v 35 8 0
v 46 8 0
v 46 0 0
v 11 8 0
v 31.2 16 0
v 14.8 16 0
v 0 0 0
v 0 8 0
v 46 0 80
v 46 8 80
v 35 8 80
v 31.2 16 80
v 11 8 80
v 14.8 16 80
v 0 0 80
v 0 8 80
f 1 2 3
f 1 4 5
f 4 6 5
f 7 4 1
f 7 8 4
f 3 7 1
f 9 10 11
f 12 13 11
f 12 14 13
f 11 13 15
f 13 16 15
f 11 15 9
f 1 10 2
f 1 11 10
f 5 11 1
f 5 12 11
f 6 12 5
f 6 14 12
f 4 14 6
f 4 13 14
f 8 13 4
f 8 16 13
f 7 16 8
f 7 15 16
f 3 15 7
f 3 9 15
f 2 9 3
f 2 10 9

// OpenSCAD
$fn = 32;

// ----------------------------------------------------------------------
// V guide rail: dovetail, 46 mm wide
// ----------------------------------------------------------------------

// --- parameters (mm) ---
rail_w = 46;              // rail width, X
base_t = 8;               // base plate thickness
v_depth = 8;              // V feature depth / height
v_half_w = 12;            // half width of the V at the base face
plate_t = 80;             // rail length, Z (the extrusion height)
top_half_w = 8.2;         // half width at the dovetail top

dovetail_base = 2 * v_half_w;  // dovetail width at the base
dovetail_top = 2 * top_half_w;  // dovetail width at the top

profile = [[0, 0], [46, 0], [46, 8], [35, 8], [31.2, 16], [14.8, 16], [11, 8], [0, 8]];  // primary outline, 8 points, counter clockwise

// --- the one profile operation ---
linear_extrude(height = plate_t) polygon(points = profile);
